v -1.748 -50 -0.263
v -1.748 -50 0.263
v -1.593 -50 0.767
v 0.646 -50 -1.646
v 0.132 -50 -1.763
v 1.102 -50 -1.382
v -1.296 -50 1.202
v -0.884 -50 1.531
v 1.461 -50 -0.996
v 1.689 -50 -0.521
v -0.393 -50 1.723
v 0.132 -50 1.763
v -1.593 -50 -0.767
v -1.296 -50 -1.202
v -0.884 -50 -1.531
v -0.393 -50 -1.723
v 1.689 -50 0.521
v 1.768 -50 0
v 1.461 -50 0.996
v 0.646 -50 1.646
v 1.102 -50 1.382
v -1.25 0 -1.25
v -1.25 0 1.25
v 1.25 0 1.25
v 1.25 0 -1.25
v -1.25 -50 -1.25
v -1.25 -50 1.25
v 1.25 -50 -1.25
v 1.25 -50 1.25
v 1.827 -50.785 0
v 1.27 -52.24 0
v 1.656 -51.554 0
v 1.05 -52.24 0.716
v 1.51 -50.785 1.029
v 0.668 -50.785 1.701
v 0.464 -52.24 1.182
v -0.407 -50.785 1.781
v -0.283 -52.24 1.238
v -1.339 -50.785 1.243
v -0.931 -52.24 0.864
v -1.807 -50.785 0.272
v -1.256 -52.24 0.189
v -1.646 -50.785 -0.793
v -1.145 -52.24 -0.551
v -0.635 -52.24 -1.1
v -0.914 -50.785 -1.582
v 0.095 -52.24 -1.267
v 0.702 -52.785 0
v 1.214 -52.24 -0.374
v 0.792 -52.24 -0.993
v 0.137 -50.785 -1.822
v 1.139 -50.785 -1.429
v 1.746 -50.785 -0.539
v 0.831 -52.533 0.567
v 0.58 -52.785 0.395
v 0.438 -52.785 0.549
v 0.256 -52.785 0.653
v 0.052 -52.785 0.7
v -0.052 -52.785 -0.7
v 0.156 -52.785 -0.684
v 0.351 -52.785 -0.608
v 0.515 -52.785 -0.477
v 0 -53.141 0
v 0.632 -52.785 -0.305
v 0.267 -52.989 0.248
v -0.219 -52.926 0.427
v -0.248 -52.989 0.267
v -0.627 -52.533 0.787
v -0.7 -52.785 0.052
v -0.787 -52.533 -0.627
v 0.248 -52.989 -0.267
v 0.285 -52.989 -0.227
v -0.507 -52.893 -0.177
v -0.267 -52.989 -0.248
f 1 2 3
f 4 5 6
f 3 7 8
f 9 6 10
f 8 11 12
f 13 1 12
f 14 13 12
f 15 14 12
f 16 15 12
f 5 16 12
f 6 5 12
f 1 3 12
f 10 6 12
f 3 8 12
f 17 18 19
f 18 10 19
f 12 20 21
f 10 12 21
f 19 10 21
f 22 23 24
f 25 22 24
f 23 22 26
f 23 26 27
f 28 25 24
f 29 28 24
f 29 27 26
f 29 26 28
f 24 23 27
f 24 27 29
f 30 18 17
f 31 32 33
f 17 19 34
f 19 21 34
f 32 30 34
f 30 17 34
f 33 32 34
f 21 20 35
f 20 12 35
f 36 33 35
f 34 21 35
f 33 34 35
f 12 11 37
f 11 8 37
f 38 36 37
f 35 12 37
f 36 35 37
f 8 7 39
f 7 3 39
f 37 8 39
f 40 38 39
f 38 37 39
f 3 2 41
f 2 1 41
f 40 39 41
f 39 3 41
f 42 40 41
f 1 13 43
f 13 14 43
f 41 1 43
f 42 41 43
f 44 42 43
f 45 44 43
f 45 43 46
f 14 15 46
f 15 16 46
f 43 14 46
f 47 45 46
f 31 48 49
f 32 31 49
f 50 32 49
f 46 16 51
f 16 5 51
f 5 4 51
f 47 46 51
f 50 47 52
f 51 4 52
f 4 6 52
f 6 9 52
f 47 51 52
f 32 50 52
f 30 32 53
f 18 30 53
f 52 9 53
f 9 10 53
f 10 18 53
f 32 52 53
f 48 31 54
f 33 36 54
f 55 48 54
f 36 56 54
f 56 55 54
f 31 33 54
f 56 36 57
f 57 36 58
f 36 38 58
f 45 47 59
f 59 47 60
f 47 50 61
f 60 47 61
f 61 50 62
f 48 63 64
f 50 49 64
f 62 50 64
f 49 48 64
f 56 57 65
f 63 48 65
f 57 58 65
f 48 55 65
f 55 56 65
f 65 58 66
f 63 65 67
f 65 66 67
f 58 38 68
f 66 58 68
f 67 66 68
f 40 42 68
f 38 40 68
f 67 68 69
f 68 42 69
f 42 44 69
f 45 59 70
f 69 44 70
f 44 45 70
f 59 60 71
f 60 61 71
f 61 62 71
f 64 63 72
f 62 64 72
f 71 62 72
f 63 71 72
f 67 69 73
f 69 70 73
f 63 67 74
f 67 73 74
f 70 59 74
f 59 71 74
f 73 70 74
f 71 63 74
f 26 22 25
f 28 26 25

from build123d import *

# Parameters (mm, degrees)
F0_W     = 2.5
F0_H     = 2.5
F1_DEPTH = 50


with BuildPart() as f1:
    # F0 (on Front) → F1 (new body)
    with BuildSketch(Plane.XZ):
        Rectangle(F0_W, F0_H)
    extrude(amount=F1_DEPTH)


with BuildPart() as f4:
    # F3 (on Top) → F4 (revolve)
    with BuildSketch(Plane.XY):
        with BuildLine():
            ThreePointArc((0, -53.141449), (1.488636, -51.911033), (1.767767, -50))
            Line((1.767767, -50), (0, -50))
            Line((0, -50), (0, -53.141449))
        make_face()
    revolve(axis=Axis((0, -51.570724, 0), (0, -1, 0)))


solid = Compound([f1.part, f4.part])
